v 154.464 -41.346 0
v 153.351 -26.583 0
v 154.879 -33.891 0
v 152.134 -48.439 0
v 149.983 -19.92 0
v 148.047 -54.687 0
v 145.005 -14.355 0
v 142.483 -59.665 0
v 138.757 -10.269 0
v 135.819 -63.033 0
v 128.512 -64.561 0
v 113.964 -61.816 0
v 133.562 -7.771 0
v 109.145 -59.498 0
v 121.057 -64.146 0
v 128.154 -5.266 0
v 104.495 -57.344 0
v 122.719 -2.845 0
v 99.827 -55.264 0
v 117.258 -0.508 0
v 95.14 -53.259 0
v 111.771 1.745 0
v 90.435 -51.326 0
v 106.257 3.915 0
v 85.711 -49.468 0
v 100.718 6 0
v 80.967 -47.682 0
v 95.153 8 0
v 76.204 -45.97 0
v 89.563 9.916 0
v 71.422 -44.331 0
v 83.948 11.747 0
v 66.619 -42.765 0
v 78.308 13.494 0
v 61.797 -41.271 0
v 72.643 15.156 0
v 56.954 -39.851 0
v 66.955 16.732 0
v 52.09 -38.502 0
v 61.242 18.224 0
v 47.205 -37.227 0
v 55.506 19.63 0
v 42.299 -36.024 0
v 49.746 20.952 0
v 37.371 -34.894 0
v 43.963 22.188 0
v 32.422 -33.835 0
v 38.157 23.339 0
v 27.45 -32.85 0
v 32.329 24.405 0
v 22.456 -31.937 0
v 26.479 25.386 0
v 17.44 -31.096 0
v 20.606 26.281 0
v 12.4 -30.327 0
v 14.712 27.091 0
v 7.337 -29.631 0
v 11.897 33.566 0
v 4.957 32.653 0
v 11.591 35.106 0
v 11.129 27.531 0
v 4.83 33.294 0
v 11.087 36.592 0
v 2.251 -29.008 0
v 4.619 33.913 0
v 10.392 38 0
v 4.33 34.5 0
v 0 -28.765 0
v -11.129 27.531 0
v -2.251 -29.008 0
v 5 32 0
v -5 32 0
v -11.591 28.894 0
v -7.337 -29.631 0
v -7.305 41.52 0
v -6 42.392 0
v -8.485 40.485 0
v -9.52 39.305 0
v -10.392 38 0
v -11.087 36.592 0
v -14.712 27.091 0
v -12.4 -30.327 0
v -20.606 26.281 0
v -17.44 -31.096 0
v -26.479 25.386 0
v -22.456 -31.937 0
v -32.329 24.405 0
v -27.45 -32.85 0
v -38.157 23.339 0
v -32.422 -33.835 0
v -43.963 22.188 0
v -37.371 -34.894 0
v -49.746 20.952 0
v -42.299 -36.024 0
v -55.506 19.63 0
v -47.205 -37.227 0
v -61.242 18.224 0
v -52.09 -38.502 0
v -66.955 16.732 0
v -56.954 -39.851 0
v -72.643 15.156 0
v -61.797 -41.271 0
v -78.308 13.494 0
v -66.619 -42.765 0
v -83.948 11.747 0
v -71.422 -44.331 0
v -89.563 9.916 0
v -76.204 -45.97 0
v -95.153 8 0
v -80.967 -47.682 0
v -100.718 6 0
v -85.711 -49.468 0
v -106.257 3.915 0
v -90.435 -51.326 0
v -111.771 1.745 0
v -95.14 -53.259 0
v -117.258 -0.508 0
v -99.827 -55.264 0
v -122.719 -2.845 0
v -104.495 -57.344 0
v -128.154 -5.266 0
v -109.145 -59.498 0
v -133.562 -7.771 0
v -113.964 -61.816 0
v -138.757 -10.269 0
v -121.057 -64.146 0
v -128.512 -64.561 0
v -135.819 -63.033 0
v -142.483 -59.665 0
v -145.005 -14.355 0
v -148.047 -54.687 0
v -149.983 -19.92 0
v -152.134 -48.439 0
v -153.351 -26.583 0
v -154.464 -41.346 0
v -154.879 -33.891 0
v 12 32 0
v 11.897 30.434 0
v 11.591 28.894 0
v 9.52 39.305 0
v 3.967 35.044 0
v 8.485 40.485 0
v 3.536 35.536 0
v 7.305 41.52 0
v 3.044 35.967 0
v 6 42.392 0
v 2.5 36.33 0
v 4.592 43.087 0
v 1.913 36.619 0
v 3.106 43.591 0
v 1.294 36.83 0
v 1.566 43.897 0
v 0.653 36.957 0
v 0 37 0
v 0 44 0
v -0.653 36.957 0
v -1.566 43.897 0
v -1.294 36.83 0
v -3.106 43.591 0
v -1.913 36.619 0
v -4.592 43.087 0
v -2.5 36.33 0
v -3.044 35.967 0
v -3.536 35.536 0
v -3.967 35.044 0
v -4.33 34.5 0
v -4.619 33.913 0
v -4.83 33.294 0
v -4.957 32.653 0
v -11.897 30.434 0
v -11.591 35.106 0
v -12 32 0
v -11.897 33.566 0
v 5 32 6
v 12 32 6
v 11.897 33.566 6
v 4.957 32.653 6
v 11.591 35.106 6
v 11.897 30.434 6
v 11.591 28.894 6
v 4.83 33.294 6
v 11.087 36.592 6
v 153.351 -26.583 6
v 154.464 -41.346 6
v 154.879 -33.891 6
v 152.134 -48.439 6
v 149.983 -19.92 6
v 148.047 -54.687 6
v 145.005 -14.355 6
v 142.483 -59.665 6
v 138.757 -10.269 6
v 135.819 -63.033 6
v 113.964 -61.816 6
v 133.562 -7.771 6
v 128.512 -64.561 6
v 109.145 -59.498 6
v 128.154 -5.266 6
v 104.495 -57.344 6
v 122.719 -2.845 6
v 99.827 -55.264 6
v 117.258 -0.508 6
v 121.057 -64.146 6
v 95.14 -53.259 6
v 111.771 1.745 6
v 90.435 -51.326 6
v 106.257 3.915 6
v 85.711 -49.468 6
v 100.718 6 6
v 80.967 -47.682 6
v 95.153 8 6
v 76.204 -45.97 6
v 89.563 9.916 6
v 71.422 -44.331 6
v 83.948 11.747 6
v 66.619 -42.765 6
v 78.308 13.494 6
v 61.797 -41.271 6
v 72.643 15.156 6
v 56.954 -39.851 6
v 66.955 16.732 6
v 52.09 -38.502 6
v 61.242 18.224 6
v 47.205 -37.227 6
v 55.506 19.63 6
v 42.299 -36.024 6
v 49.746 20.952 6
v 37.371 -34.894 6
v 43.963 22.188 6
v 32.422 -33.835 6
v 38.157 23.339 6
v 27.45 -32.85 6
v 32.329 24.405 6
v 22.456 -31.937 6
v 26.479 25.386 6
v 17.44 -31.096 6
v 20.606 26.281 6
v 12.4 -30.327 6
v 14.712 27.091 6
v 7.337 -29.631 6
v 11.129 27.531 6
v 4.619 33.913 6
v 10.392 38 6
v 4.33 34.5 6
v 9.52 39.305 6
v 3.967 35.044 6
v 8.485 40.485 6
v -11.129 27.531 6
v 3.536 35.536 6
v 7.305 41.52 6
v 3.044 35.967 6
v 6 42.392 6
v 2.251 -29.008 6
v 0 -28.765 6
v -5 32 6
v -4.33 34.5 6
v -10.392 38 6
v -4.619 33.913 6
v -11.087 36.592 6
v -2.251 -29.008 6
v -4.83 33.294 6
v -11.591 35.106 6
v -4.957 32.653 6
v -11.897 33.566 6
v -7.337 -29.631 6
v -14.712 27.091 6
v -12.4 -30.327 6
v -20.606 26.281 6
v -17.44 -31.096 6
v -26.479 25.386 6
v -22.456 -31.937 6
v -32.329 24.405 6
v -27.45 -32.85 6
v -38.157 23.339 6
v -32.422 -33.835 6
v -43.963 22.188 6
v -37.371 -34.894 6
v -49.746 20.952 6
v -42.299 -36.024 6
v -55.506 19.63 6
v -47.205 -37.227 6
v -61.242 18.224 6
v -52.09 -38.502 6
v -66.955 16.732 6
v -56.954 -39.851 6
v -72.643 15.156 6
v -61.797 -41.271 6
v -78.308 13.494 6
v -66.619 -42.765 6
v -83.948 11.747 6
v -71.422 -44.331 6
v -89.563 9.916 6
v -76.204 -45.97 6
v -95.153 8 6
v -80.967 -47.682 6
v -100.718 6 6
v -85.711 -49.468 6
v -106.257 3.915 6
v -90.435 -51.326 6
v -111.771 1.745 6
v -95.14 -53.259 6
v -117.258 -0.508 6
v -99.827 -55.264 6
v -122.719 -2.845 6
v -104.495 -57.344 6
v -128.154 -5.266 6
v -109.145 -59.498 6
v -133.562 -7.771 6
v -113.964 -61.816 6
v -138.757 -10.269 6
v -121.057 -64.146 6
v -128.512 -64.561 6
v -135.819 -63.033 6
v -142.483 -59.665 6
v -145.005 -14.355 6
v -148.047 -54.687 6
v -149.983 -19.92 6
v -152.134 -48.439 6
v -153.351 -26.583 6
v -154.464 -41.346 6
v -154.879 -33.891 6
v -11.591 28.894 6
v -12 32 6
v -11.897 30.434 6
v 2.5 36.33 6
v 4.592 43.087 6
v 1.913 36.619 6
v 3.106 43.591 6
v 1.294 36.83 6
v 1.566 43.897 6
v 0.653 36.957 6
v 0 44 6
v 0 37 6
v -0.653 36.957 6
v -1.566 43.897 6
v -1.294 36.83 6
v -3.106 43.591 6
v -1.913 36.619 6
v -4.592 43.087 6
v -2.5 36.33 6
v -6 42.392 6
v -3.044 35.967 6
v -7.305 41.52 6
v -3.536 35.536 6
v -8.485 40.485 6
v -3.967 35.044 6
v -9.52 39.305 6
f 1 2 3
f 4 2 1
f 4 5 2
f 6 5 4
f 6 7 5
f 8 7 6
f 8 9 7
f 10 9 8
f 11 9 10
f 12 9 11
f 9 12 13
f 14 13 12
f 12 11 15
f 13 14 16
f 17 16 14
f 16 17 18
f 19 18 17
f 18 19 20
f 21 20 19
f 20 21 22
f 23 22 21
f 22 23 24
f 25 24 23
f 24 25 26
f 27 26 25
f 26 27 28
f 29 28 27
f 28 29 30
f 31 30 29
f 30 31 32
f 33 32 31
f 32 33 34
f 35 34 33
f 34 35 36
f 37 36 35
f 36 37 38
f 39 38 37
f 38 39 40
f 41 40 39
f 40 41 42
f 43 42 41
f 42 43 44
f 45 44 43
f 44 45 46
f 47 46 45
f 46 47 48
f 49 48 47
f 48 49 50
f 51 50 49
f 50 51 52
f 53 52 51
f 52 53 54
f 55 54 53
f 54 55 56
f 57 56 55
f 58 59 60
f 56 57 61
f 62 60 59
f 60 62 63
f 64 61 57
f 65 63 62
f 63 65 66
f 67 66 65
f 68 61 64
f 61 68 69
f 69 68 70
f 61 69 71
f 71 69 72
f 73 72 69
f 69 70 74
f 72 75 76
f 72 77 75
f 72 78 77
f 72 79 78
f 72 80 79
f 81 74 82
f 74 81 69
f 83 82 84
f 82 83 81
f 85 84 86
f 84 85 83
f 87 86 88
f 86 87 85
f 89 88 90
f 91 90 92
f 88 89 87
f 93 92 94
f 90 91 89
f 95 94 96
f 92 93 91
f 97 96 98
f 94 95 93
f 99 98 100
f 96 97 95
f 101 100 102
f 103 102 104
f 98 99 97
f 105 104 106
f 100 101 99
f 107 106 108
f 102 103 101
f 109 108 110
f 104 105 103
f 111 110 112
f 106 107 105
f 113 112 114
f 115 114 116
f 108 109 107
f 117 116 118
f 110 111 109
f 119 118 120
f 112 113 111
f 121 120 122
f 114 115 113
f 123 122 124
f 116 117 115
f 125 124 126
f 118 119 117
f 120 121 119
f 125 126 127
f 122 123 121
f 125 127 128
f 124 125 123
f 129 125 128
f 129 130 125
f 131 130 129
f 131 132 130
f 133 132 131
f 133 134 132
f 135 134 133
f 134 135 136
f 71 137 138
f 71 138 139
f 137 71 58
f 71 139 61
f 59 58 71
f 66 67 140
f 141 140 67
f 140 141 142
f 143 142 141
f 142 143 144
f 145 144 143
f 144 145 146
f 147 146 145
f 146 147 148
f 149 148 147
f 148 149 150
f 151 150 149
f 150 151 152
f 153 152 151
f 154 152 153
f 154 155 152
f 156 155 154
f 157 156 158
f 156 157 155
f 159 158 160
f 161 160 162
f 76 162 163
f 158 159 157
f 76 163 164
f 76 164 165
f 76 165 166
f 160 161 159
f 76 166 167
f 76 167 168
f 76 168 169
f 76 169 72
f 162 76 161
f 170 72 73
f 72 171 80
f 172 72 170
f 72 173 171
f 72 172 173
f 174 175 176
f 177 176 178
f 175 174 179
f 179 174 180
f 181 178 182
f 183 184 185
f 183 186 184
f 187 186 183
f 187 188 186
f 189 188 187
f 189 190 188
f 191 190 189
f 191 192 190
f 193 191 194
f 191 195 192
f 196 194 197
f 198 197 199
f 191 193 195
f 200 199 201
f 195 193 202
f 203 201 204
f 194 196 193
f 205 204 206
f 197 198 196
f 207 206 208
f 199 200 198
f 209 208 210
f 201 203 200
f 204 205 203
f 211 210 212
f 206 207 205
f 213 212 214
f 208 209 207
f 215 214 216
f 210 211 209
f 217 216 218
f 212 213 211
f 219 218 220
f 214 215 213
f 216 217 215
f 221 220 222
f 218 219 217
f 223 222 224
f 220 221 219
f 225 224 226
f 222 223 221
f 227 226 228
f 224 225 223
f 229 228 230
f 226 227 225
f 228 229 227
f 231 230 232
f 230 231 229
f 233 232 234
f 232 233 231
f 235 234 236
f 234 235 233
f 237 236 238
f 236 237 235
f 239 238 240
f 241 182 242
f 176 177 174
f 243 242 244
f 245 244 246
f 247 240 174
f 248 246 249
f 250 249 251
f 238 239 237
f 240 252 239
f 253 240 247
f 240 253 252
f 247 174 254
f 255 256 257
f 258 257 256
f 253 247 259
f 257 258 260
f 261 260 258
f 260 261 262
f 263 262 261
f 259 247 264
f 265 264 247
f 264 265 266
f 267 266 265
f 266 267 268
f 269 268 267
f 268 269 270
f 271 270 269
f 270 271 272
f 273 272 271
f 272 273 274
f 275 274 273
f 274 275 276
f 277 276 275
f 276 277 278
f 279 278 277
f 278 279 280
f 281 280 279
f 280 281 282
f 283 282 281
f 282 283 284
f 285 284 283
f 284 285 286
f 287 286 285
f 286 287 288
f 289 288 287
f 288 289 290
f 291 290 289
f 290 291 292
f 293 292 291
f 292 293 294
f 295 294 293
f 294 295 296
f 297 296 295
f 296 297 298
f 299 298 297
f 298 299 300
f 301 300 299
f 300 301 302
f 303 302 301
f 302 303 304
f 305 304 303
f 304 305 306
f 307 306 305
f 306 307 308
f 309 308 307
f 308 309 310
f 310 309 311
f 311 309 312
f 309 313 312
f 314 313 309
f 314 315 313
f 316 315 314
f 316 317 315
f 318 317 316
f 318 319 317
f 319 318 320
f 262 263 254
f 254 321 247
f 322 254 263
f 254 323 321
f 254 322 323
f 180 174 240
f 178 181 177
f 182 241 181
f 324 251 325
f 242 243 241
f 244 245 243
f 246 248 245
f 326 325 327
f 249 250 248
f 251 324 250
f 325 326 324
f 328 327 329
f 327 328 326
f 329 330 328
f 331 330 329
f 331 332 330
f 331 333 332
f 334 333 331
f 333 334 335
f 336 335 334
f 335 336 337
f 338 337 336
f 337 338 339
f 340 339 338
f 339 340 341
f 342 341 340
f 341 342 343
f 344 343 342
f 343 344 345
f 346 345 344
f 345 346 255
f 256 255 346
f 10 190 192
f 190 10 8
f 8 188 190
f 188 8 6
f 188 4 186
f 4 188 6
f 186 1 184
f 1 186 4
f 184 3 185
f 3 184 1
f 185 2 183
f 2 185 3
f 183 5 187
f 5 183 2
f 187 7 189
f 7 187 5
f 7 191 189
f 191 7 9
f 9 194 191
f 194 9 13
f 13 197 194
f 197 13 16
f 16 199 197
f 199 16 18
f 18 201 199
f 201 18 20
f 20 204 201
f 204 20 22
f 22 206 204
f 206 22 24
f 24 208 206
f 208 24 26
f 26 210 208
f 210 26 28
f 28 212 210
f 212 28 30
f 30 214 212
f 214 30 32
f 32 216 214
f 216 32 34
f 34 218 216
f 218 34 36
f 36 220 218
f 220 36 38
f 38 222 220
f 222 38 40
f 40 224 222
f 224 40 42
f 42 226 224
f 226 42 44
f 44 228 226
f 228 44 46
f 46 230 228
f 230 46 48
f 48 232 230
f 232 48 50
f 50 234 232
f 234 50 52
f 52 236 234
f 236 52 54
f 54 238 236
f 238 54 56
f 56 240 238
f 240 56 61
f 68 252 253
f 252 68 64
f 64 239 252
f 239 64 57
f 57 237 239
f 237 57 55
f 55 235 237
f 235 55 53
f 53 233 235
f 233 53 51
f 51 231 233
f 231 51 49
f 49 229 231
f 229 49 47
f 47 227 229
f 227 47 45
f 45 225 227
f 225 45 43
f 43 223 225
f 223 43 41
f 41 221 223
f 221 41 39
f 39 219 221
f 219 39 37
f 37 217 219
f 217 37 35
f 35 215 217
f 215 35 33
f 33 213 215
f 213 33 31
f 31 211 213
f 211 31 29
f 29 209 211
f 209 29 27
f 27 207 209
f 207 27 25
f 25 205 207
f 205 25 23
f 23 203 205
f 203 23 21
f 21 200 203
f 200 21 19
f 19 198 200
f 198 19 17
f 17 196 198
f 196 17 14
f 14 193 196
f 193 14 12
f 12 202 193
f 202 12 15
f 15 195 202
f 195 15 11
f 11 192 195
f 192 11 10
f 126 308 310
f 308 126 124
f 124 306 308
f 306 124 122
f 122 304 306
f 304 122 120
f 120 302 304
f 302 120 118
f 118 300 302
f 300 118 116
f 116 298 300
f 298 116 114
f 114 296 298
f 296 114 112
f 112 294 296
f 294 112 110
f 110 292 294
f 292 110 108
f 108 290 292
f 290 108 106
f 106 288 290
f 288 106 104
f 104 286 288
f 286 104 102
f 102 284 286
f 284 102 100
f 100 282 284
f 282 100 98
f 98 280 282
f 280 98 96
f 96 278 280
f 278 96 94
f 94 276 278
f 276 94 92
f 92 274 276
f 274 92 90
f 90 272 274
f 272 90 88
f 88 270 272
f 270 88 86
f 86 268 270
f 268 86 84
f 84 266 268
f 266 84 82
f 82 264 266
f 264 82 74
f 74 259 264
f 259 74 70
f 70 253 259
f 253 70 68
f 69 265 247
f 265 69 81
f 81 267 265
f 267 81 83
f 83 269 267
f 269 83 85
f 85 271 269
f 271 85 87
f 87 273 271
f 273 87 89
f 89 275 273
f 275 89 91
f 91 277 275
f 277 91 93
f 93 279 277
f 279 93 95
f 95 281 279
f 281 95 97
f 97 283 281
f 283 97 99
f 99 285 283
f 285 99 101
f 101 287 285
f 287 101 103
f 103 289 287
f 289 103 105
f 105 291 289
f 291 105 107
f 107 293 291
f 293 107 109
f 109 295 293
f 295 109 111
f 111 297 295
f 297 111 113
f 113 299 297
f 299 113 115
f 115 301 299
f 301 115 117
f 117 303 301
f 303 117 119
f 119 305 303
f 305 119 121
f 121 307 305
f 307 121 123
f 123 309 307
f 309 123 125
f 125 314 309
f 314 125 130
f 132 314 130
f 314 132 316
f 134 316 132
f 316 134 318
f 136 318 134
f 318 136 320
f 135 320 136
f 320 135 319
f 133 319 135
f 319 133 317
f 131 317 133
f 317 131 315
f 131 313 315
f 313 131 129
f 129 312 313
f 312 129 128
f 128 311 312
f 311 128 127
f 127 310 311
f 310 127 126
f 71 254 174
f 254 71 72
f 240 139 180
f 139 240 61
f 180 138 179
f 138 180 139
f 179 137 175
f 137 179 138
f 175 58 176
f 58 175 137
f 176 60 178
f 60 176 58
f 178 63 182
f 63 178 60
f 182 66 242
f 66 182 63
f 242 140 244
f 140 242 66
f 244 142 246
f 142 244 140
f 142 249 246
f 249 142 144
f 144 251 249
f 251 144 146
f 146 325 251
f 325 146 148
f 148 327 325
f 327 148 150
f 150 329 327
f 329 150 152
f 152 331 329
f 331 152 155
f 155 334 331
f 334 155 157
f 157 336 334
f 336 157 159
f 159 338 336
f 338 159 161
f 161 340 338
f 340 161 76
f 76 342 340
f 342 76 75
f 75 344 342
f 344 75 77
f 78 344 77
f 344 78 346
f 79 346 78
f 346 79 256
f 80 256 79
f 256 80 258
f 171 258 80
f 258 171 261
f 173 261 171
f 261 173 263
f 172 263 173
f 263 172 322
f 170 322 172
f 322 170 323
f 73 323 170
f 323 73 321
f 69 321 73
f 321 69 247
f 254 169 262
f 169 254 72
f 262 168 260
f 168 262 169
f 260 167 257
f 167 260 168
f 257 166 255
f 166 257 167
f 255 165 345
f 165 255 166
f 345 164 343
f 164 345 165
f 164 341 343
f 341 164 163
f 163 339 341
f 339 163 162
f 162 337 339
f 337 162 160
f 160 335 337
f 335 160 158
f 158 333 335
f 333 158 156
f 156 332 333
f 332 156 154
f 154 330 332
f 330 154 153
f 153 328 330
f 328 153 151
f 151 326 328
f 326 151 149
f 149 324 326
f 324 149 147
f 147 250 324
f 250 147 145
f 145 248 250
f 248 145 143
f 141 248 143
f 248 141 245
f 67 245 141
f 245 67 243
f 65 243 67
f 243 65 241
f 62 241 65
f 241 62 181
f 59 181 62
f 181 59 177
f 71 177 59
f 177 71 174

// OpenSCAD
// hanger-print: rack w16 w=16 cm slope=15.92 deg bow=0.59 cm r=2.86 cm depth=6.0 mm
// Print flat (layers parallel to the page). Generated by hanger_print.mesh.scad; do not edit by hand.
depth = 6.0;
union() {
  linear_extrude(height = depth) polygon([[3.066, 28.435], [8.796, 27.817], [14.712, 27.091], [20.606, 26.281], [26.479, 25.386], [32.329, 24.405], [38.157, 23.339], [43.963, 22.188], [49.746, 20.952], [55.506, 19.630], [61.242, 18.224], [66.955, 16.732], [72.643, 15.156], [78.308, 13.494], [83.948, 11.747], [89.563, 9.916], [95.153, 8.000], [100.718, 6.000], [106.257, 3.915], [111.771, 1.745], [117.258, -0.508], [122.719, -2.845], [128.154, -5.266], [133.562, -7.771], [138.757, -10.269], [145.005, -14.355], [149.983, -19.920], [153.351, -26.583], [154.879, -33.891], [154.464, -41.346], [152.134, -48.439], [148.047, -54.687], [142.483, -59.665], [135.819, -63.033], [128.512, -64.561], [121.057, -64.146], [113.964, -61.816], [109.145, -59.498], [104.495, -57.344], [99.827, -55.264], [95.140, -53.259], [90.435, -51.326], [85.711, -49.468], [80.967, -47.682], [76.204, -45.970], [71.422, -44.331], [66.619, -42.765], [61.797, -41.271], [56.954, -39.851], [52.090, -38.502], [47.205, -37.227], [42.299, -36.024], [37.371, -34.894], [32.422, -33.835], [27.450, -32.850], [22.456, -31.937], [17.440, -31.096], [12.400, -30.327], [7.337, -29.631], [2.251, -29.008], [-3.066, -28.435]]);
  linear_extrude(height = depth) polygon([[3.066, -28.435], [-2.251, -29.008], [-7.337, -29.631], [-12.400, -30.327], [-17.440, -31.096], [-22.456, -31.937], [-27.450, -32.850], [-32.422, -33.835], [-37.371, -34.894], [-42.299, -36.024], [-47.205, -37.227], [-52.090, -38.502], [-56.954, -39.851], [-61.797, -41.271], [-66.619, -42.765], [-71.422, -44.331], [-76.204, -45.970], [-80.967, -47.682], [-85.711, -49.468], [-90.435, -51.326], [-95.140, -53.259], [-99.827, -55.264], [-104.495, -57.344], [-109.145, -59.498], [-113.964, -61.816], [-121.057, -64.146], [-128.512, -64.561], [-135.819, -63.033], [-142.483, -59.665], [-148.047, -54.687], [-152.134, -48.439], [-154.464, -41.346], [-154.879, -33.891], [-153.351, -26.583], [-149.983, -19.920], [-145.005, -14.355], [-138.757, -10.269], [-133.562, -7.771], [-128.154, -5.266], [-122.719, -2.845], [-117.258, -0.508], [-111.771, 1.745], [-106.257, 3.915], [-100.718, 6.000], [-95.153, 8.000], [-89.563, 9.916], [-83.948, 11.747], [-78.308, 13.494], [-72.643, 15.156], [-66.955, 16.732], [-61.242, 18.224], [-55.506, 19.630], [-49.746, 20.952], [-43.963, 22.188], [-38.157, 23.339], [-32.329, 24.405], [-26.479, 25.386], [-20.606, 26.281], [-14.712, 27.091], [-8.796, 27.817], [-3.066, 28.435]]);
  linear_extrude(height = depth) polygon([[28.600, 0.000], [28.355, 3.733], [27.625, 7.402], [26.423, 10.945], [24.768, 14.300], [22.690, 17.411], [20.223, 20.223], [17.411, 22.690], [14.300, 24.768], [10.945, 26.423], [7.402, 27.625], [3.733, 28.355], [0.000, 28.600], [-3.733, 28.355], [-7.402, 27.625], [-10.945, 26.423], [-14.300, 24.768], [-17.411, 22.690], [-20.223, 20.223], [-22.690, 17.411], [-24.768, 14.300], [-26.423, 10.945], [-27.625, 7.402], [-28.355, 3.733], [-28.600, 0.000], [-28.355, -3.733], [-27.625, -7.402], [-26.423, -10.945], [-24.768, -14.300], [-22.690, -17.411], [-20.223, -20.223], [-17.411, -22.690], [-14.300, -24.768], [-10.945, -26.423], [-7.402, -27.625], [-3.733, -28.355], [-0.000, -28.600], [3.733, -28.355], [7.402, -27.625], [10.945, -26.423], [14.300, -24.768], [17.411, -22.690], [20.223, -20.223], [22.690, -17.411], [24.768, -14.300], [26.423, -10.945], [27.625, -7.402], [28.355, -3.733]]);
  linear_extrude(height = depth) polygon([[-7.000, 0.000], [7.000, 0.000], [7.000, 32.000], [-7.000, 32.000]]);
  linear_extrude(height = depth) difference() { polygon([[12.000, 32.000], [11.897, 33.566], [11.591, 35.106], [11.087, 36.592], [10.392, 38.000], [9.520, 39.305], [8.485, 40.485], [7.305, 41.520], [6.000, 42.392], [4.592, 43.087], [3.106, 43.591], [1.566, 43.897], [0.000, 44.000], [-1.566, 43.897], [-3.106, 43.591], [-4.592, 43.087], [-6.000, 42.392], [-7.305, 41.520], [-8.485, 40.485], [-9.520, 39.305], [-10.392, 38.000], [-11.087, 36.592], [-11.591, 35.106], [-11.897, 33.566], [-12.000, 32.000], [-11.897, 30.434], [-11.591, 28.894], [-11.087, 27.408], [-10.392, 26.000], [-9.520, 24.695], [-8.485, 23.515], [-7.305, 22.480], [-6.000, 21.608], [-4.592, 20.913], [-3.106, 20.409], [-1.566, 20.103], [-0.000, 20.000], [1.566, 20.103], [3.106, 20.409], [4.592, 20.913], [6.000, 21.608], [7.305, 22.480], [8.485, 23.515], [9.520, 24.695], [10.392, 26.000], [11.087, 27.408], [11.591, 28.894], [11.897, 30.434]]); polygon([[5.000, 32.000], [4.957, 32.653], [4.830, 33.294], [4.619, 33.913], [4.330, 34.500], [3.967, 35.044], [3.536, 35.536], [3.044, 35.967], [2.500, 36.330], [1.913, 36.619], [1.294, 36.830], [0.653, 36.957], [0.000, 37.000], [-0.653, 36.957], [-1.294, 36.830], [-1.913, 36.619], [-2.500, 36.330], [-3.044, 35.967], [-3.536, 35.536], [-3.967, 35.044], [-4.330, 34.500], [-4.619, 33.913], [-4.830, 33.294], [-4.957, 32.653], [-5.000, 32.000], [-4.957, 31.347], [-4.830, 30.706], [-4.619, 30.087], [-4.330, 29.500], [-3.967, 28.956], [-3.536, 28.464], [-3.044, 28.033], [-2.500, 27.670], [-1.913, 27.381], [-1.294, 27.170], [-0.653, 27.043], [-0.000, 27.000], [0.653, 27.043], [1.294, 27.170], [1.913, 27.381], [2.500, 27.670], [3.044, 28.033], [3.536, 28.464], [3.967, 28.956], [4.330, 29.500], [4.619, 30.087], [4.830, 30.706], [4.957, 31.347]]); }
}
